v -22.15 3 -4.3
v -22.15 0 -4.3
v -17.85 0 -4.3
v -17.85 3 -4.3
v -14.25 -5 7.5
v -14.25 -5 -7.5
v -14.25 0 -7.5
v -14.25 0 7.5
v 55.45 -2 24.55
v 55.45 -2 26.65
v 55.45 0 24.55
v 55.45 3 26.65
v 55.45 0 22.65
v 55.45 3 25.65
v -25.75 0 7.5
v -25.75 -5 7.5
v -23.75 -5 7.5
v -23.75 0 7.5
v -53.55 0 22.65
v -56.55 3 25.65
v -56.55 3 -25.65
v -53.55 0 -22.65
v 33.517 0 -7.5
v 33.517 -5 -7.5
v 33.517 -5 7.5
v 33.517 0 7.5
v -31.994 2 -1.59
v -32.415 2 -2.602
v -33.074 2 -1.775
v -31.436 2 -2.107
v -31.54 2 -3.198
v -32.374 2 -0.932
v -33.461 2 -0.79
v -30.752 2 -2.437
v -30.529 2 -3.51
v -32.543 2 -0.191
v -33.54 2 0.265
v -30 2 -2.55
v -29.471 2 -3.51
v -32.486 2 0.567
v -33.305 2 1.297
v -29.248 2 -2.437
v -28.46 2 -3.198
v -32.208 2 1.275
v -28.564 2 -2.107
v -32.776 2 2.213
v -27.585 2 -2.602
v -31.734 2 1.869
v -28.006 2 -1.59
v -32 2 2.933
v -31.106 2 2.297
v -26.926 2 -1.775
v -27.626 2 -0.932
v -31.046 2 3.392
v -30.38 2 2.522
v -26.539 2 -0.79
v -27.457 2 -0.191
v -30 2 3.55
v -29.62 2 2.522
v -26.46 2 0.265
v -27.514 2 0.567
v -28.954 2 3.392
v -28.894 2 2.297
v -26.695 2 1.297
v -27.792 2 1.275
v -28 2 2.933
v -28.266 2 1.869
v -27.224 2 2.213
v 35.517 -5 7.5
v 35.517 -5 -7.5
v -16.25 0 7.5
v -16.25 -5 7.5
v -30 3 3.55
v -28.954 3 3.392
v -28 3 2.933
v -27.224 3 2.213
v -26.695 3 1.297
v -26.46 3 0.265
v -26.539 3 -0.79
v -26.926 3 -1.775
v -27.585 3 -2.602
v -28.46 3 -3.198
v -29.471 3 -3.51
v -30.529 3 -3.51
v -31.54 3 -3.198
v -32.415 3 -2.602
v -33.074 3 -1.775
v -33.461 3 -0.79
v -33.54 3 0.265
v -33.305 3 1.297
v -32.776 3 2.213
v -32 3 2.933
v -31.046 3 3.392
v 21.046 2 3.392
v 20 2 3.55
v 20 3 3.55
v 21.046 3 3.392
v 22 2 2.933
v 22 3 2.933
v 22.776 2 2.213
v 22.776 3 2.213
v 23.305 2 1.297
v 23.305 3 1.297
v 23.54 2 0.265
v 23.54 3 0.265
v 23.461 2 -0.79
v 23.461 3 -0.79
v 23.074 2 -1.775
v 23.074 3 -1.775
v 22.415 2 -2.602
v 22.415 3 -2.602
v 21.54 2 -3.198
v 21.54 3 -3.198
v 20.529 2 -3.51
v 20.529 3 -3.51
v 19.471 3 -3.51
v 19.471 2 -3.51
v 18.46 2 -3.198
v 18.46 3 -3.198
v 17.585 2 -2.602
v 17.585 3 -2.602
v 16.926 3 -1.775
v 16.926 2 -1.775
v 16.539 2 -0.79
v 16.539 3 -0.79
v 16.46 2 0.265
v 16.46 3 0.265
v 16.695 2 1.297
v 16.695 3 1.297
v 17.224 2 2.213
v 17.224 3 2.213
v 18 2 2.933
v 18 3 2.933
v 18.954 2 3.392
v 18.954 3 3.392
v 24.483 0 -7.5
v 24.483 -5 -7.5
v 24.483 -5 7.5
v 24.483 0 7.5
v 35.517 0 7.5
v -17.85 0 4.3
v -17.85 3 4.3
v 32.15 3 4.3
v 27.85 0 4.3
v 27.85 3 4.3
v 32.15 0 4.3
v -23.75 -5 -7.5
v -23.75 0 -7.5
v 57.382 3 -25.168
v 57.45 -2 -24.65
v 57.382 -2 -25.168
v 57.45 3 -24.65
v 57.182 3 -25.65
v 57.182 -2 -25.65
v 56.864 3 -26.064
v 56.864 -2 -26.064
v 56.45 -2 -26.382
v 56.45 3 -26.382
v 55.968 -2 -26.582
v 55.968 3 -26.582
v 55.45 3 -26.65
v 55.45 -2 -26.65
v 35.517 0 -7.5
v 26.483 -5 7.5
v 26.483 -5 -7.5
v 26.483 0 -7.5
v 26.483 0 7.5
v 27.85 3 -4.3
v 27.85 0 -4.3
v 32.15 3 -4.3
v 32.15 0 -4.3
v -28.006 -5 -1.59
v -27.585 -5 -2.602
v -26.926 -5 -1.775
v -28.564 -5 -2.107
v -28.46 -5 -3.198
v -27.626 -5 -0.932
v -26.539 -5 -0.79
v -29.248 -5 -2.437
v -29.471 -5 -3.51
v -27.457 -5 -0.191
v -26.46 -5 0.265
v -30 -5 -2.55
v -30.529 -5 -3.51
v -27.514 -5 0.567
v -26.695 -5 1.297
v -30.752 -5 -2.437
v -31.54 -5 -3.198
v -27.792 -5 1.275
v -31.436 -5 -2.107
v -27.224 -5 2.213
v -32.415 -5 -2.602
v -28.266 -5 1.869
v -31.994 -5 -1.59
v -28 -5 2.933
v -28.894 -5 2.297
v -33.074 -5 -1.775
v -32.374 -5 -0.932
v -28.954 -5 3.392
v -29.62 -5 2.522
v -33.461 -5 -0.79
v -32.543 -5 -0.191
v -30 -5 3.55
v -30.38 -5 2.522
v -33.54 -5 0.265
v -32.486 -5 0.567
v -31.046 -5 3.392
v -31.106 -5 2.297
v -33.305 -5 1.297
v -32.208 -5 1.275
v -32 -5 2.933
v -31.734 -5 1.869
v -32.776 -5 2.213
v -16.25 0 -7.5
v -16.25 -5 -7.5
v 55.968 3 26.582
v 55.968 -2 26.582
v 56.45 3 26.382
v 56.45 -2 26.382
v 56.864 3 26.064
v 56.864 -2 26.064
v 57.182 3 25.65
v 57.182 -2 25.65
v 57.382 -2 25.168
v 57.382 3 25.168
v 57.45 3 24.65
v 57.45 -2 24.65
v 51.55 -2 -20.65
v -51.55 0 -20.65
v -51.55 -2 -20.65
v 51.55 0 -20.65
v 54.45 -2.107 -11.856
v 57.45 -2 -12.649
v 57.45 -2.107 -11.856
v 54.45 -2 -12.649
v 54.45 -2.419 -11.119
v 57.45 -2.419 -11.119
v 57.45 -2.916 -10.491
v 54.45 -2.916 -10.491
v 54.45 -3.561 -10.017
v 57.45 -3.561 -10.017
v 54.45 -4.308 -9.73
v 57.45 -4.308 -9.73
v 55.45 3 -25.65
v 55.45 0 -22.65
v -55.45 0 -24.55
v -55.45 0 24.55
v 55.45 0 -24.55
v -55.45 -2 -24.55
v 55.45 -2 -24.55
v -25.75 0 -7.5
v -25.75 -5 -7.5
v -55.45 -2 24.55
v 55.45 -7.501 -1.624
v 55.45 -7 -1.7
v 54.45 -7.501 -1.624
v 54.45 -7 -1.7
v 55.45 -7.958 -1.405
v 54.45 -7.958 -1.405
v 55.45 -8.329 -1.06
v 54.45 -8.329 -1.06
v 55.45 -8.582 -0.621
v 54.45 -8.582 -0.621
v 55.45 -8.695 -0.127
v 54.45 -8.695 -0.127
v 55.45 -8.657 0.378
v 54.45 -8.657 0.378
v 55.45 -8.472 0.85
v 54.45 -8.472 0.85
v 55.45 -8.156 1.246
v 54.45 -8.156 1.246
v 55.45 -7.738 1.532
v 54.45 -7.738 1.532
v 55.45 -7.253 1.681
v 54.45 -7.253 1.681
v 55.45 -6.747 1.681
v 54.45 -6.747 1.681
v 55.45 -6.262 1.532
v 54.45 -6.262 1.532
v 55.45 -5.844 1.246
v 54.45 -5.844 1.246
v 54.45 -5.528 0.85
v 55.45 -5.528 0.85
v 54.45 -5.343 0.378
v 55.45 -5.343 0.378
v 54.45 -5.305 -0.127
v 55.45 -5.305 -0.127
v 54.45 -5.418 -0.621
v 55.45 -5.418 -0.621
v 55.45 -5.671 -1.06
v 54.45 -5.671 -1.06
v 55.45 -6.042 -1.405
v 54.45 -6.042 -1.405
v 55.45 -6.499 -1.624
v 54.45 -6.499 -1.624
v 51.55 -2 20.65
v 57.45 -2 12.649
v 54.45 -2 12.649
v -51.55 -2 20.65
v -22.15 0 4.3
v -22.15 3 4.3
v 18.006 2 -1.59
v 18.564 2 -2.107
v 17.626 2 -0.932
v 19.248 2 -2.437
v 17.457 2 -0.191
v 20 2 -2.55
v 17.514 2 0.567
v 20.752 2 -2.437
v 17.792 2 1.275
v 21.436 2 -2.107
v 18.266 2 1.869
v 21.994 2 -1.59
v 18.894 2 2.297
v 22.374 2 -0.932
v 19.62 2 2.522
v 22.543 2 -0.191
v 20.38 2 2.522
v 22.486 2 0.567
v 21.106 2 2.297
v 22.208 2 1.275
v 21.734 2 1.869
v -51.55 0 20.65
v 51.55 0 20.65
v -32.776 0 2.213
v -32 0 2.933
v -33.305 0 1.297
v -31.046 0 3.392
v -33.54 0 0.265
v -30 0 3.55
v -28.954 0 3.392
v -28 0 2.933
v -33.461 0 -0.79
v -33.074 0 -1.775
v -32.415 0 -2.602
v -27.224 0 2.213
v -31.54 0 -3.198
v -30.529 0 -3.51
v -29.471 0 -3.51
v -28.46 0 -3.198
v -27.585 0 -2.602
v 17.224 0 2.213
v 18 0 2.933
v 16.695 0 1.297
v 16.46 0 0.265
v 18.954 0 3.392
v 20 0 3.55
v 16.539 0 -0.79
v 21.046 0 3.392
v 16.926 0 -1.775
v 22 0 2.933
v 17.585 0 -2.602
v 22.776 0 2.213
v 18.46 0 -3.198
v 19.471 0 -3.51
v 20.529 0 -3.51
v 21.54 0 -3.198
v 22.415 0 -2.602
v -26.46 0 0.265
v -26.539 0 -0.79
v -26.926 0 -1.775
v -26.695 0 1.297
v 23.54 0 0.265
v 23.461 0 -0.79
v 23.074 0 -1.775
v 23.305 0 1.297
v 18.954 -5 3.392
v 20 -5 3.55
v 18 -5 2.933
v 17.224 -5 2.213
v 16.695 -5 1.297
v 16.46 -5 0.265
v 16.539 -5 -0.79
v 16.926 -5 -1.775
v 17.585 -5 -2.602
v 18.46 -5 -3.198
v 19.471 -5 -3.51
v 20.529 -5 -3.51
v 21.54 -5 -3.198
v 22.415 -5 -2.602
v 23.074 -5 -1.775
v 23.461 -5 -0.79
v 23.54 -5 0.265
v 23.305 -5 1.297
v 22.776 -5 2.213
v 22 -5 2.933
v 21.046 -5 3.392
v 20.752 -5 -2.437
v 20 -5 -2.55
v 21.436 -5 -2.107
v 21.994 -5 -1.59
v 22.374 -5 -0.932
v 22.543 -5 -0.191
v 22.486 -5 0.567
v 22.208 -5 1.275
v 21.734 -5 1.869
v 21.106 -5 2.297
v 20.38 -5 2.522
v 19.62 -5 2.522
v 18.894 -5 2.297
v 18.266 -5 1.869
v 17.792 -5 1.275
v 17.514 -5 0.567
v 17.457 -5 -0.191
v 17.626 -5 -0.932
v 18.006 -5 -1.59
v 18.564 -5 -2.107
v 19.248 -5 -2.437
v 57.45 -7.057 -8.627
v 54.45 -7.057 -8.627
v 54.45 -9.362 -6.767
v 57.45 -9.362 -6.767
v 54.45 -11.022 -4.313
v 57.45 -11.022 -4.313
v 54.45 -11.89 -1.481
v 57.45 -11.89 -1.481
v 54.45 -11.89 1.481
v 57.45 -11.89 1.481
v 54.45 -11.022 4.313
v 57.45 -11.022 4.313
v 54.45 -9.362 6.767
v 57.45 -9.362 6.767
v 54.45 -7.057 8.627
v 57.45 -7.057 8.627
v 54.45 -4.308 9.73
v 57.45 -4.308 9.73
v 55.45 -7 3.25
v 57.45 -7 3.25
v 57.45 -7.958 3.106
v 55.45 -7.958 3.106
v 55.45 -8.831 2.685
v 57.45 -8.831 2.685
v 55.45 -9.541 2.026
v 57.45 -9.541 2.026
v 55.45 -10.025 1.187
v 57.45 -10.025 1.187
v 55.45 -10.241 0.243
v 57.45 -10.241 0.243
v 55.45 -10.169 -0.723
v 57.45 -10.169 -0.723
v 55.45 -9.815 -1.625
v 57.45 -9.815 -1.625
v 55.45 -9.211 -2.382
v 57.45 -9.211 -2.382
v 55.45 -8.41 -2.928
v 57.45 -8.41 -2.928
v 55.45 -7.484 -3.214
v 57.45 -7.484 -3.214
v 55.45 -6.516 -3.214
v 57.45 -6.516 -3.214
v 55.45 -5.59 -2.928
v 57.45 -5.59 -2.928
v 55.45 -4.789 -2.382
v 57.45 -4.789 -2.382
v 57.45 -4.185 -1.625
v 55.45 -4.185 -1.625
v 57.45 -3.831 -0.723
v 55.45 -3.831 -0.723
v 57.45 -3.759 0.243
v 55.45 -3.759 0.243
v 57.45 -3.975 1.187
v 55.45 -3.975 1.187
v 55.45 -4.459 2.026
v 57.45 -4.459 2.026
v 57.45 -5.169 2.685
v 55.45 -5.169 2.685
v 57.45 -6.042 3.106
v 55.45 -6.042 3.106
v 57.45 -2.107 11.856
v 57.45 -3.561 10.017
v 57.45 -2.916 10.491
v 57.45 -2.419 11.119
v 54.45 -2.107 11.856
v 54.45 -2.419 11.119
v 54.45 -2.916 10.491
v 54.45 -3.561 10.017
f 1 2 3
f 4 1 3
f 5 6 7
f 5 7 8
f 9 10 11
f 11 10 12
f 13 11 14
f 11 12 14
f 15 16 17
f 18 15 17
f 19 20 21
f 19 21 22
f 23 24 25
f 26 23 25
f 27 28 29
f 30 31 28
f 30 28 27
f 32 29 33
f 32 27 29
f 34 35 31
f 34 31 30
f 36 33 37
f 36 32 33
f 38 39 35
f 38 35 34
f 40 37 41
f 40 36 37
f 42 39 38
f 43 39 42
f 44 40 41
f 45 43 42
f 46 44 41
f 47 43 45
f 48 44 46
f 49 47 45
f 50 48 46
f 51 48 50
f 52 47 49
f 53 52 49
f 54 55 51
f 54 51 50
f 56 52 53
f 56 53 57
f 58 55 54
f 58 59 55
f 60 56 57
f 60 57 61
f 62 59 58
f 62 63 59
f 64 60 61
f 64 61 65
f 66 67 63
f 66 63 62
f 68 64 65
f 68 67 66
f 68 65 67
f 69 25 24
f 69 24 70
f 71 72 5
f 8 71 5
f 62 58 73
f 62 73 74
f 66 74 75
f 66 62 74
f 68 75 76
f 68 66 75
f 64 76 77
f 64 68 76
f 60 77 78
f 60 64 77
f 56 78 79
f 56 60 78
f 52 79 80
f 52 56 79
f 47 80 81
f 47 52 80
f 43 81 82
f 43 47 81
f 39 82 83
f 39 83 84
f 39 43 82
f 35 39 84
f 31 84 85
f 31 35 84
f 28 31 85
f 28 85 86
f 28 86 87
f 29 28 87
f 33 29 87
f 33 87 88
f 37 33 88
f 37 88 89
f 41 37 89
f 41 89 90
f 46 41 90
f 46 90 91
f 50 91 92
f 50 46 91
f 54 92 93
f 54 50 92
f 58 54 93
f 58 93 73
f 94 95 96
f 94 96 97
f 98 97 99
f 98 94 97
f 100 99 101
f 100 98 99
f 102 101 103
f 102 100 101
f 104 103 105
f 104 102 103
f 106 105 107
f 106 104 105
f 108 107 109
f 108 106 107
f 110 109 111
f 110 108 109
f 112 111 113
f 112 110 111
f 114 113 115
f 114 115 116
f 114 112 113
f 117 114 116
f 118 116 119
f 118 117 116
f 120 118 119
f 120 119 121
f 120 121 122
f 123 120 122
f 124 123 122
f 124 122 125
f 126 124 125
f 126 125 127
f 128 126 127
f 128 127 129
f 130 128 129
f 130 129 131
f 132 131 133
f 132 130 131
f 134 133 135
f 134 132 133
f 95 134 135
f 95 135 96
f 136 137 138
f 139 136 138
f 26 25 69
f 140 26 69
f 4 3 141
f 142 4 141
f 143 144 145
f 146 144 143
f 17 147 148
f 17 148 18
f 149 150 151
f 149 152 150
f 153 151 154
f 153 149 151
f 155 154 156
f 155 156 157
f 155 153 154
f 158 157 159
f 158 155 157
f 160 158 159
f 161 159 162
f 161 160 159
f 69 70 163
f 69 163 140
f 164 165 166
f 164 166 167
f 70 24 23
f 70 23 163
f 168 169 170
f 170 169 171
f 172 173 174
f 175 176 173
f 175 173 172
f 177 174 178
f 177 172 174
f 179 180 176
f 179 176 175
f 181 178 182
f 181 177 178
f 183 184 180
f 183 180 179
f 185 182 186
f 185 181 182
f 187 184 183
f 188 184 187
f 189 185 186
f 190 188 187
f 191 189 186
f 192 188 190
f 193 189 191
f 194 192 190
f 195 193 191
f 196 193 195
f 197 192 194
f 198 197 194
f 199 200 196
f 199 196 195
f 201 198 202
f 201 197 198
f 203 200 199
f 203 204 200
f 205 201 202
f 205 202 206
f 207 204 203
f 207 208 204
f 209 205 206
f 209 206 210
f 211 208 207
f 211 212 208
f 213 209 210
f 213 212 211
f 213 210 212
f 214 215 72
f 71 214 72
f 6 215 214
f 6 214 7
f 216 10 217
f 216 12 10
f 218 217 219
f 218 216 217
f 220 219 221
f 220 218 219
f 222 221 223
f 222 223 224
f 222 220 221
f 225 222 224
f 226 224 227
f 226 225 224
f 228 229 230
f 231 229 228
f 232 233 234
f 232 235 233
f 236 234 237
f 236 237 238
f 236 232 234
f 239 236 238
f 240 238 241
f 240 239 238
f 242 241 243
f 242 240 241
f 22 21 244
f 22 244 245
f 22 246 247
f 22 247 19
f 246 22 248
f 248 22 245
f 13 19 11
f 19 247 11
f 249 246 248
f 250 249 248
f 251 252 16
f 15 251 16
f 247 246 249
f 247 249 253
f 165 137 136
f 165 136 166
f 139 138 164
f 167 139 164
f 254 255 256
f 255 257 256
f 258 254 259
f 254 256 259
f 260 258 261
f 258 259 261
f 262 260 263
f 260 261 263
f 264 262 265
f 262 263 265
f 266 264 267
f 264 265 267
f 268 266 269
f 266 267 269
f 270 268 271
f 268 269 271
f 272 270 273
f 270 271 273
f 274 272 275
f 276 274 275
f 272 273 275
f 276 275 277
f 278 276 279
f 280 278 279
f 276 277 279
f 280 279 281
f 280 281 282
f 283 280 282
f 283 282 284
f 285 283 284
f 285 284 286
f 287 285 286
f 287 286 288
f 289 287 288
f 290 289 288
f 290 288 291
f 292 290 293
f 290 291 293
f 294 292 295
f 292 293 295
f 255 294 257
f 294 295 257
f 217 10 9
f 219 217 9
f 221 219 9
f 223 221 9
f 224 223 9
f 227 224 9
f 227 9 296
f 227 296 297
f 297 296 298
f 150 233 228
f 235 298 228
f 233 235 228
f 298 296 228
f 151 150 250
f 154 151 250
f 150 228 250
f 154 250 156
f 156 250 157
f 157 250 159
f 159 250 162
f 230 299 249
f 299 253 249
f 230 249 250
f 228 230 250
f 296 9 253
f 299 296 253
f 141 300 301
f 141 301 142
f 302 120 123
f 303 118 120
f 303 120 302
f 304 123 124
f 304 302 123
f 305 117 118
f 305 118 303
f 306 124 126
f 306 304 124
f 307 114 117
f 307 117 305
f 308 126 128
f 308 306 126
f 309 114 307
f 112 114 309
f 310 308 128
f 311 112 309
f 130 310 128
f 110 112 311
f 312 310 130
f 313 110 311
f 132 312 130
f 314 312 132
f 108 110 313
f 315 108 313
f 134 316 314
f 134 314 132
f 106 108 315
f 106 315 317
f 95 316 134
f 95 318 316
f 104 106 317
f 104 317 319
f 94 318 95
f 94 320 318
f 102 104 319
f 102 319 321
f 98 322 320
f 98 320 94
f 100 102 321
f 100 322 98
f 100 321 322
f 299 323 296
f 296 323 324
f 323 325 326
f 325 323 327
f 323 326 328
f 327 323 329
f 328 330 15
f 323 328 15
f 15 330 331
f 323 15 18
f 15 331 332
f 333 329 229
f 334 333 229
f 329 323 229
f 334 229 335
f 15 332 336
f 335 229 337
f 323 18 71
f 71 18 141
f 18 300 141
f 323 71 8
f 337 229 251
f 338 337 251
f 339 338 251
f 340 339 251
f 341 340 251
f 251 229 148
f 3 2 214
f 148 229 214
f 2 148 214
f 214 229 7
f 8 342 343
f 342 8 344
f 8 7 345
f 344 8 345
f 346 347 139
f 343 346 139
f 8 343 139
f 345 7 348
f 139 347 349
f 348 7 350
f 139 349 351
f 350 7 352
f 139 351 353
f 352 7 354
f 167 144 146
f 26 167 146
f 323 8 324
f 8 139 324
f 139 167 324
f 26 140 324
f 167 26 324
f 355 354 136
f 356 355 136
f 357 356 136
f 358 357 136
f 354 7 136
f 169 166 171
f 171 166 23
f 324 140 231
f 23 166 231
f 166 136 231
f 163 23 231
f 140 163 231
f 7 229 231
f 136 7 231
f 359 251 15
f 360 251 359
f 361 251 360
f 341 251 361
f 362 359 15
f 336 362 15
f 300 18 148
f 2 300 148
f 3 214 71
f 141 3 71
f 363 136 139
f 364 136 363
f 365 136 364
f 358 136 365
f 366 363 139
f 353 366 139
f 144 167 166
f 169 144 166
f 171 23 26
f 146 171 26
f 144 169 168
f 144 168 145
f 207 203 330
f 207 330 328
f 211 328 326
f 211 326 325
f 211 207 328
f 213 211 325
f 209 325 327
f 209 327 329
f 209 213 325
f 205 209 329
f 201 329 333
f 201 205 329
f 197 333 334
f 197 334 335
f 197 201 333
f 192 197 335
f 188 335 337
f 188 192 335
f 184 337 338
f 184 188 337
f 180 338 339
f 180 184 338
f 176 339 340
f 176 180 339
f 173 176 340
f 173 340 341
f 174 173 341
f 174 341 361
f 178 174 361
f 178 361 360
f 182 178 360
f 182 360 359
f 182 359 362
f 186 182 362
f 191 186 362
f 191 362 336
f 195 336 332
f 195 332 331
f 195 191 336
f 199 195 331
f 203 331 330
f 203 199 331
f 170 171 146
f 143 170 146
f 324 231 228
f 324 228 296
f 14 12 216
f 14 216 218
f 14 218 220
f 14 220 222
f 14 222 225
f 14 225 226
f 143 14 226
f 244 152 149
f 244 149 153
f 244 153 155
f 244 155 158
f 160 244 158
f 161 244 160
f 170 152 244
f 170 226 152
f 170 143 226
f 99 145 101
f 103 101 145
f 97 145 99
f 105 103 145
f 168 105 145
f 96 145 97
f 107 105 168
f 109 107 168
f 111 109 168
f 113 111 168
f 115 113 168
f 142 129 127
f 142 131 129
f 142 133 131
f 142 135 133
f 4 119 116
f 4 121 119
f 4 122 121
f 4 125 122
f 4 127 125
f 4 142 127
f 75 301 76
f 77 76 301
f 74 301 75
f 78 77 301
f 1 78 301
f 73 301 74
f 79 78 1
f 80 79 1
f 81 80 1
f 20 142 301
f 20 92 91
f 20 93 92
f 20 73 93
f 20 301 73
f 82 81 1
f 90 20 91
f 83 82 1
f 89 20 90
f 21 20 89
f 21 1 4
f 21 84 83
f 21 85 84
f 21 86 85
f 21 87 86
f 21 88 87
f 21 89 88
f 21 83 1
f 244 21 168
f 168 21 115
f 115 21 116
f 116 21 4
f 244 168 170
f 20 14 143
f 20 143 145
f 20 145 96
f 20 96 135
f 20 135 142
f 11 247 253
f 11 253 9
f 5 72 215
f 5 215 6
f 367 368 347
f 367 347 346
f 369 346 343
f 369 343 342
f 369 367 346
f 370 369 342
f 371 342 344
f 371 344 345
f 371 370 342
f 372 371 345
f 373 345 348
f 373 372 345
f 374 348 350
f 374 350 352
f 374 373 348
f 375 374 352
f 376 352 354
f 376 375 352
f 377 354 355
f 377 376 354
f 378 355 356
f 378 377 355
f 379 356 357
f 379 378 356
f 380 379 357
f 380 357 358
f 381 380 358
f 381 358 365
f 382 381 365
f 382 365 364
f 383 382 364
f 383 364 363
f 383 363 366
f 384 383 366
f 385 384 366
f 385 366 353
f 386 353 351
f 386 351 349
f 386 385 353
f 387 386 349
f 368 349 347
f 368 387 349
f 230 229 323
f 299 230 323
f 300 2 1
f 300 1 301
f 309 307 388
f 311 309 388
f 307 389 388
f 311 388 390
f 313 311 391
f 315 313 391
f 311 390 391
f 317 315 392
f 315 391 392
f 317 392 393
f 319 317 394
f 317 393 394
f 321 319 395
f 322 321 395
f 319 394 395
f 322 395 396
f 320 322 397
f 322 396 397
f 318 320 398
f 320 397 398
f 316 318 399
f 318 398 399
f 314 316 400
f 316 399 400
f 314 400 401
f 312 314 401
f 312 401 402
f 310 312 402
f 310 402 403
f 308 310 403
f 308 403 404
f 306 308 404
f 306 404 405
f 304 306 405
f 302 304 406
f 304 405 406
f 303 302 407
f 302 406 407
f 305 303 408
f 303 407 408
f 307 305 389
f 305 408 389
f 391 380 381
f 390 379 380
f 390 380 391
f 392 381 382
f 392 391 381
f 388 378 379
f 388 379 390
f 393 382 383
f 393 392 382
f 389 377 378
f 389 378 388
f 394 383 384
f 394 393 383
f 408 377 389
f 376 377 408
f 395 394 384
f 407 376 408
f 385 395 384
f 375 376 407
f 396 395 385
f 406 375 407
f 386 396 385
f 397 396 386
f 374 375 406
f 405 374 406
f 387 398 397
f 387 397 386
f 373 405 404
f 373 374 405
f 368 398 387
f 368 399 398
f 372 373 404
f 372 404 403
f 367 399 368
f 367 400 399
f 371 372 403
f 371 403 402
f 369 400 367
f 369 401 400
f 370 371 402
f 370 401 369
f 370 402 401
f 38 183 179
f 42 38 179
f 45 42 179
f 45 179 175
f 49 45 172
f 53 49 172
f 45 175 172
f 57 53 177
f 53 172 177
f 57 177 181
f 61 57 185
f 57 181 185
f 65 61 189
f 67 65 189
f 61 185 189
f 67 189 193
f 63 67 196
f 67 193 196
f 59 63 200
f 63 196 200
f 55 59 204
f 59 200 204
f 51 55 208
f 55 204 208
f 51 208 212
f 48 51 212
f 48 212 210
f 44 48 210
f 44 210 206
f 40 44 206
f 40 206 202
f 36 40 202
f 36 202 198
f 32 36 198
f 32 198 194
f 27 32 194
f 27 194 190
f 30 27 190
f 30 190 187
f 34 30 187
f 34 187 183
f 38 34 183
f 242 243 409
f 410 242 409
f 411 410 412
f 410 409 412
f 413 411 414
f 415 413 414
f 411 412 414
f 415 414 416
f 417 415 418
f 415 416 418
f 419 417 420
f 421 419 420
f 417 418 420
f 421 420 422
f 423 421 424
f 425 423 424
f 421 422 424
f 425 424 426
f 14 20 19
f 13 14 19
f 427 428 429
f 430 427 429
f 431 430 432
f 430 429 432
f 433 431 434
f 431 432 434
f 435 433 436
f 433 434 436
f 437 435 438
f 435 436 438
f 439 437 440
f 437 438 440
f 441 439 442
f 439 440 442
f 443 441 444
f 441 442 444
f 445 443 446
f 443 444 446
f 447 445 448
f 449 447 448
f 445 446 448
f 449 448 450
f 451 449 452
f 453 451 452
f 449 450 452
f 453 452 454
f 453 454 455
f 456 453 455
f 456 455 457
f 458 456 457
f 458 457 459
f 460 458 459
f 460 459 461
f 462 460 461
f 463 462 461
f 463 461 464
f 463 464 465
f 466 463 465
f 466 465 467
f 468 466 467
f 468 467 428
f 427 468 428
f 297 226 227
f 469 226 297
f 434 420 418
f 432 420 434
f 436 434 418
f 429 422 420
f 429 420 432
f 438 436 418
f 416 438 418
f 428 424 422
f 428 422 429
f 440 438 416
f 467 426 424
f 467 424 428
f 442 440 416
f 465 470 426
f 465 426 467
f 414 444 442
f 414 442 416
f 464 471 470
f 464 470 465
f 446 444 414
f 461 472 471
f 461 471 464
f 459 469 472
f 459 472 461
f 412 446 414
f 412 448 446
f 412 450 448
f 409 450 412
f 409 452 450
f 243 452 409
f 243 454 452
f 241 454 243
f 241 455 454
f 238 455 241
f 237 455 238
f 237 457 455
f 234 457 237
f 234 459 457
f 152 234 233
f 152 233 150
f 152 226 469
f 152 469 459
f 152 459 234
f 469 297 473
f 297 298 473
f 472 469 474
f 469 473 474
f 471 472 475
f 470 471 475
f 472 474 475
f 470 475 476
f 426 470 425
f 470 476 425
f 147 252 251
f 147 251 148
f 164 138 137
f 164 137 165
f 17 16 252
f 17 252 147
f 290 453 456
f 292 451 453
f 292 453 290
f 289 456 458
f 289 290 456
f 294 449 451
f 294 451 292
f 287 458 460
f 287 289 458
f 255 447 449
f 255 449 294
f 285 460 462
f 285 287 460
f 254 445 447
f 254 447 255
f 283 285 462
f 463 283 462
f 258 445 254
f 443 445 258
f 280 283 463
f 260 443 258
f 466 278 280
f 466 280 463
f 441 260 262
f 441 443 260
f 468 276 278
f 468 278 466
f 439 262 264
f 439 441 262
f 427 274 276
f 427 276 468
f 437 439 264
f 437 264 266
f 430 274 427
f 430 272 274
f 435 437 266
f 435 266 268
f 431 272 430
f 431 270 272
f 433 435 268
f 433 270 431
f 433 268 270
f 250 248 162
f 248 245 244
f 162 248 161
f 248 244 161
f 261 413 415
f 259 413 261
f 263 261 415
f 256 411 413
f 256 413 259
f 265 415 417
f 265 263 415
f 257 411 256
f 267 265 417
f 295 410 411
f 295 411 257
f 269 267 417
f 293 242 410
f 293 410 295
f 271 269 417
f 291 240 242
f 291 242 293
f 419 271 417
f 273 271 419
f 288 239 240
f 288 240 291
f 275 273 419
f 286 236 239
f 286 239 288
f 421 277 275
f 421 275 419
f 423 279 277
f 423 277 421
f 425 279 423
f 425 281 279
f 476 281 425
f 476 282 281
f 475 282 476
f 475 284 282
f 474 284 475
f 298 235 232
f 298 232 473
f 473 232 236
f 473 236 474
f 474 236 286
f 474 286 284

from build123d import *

# Parameters (mm, degrees)
SKETCH1_W                                   = 107.1
SKETCH1_H                                   = 45.3
BOSS_EXTRUDE1_DEPTH                         = 3
SKETCH2_W                                   = 110.9
SKETCH2_H                                   = 49.1
SKETCH2_W_2                                 = 103.1
SKETCH2_H_2                                 = 41.3
BOSS_EXTRUDE2_DEPTH                         = 2
SKETCH5_W                                   = 44.185299266
SKETCH5_H                                   = 3
BOSS_EXTRUDE3_DEPTH                         = 1.9
SKETCH6_W                                   = 53.3
SKETCH6_H                                   = 5
BOSS_EXTRUDE4_DEPTH                         = 2
FILLET1_R                                   = 2
BOSS_EXTRUDE5_DEPTH                         = 3
FILLET2_R                                   = 3
CBORE_FOR_M3_CHEESE_HEAD_SCREW1_D           = 3.4
CBORE_FOR_M3_CHEESE_HEAD_SCREW1_CBORE_D     = 6.5
CBORE_FOR_M3_CHEESE_HEAD_SCREW1_CBORE_DEPTH = 2
SKETCH9_R                                   = 2.55
SKETCH9_W                                   = 4.3
SKETCH9_H                                   = 8.6
CUT_EXTRUDE1_DEPTH                          = 65.457156313
BOSS_EXTRUDE6_START                         = 5
SKETCH11_R                                  = 3.55
SKETCH11_R_2                                = 2.55
SKETCH11_W                                  = 2
SKETCH11_H                                  = 15
BOSS_EXTRUDE6_DEPTH                         = 5
CUT_EXTRUDE2_START                          = -1
SKETCH12_R                                  = 3.55
CUT_EXTRUDE2_DEPTH                          = 1


with BuildPart() as part:
    # Sketch1 → Boss-Extrude1 (new body)
    with BuildSketch(Plane(origin=(0, 0, 0), x_dir=(1, 0, 0), z_dir=(0, 1, 0))):
        Rectangle(SKETCH1_W, SKETCH1_H)
    extrude(amount=BOSS_EXTRUDE1_DEPTH)

    # Sketch2 → Boss-Extrude2 (add)
    with BuildSketch(Plane.XZ):
        Rectangle(SKETCH2_W, SKETCH2_H)
        Rectangle(SKETCH2_W_2, SKETCH2_H_2, mode=Mode.SUBTRACT)
    extrude(amount=BOSS_EXTRUDE2_DEPTH)

    # Sweep3: sweep along a path in Sketch4
    with BuildLine(Plane(origin=(0, 0, 0), x_dir=(1, 0, 0), z_dir=(0, 1, 0))) as sweep3_path:
        Line((55.45, 24.55), (-55.45, 24.55))
        Line((-55.45, 24.55), (-55.45, -24.55))
        Line((-55.45, -24.55), (55.45, -24.55))
    # Sketch3 → Sweep3 (sweep)
    with BuildSketch(Plane(origin=(55.45, 0, 0), x_dir=(0, 0, -1), z_dir=(1, 0, 0))):
        Polygon((-22.65, 3), (-25.65, 3), (-22.65, 0), (-22.092649633, 0), (-22.092649633, 3), align=None)
    sweep(path=sweep3_path.line, transition=Transition.RIGHT)

    # Sketch5 → Boss-Extrude3 (add)
    with BuildSketch(Plane(origin=(53.55, 0, 0), x_dir=(0, 0, -1), z_dir=(1, 0, 0))):
        with Locations((0, 1.5)):
            Rectangle(SKETCH5_W, SKETCH5_H)
    extrude(amount=BOSS_EXTRUDE3_DEPTH)

    # Sketch6 → Boss-Extrude4 (add)
    with BuildSketch(Plane(origin=(55.45, 0, 0), x_dir=(0, 0, -1), z_dir=(1, 0, 0))):
        with Locations((0, 0.5)):
            Rectangle(SKETCH6_W, SKETCH6_H)
    extrude(amount=BOSS_EXTRUDE4_DEPTH)

    # Fillet1
    fillet1_edges = [part.edges().sort_by_distance(p)[0] for p in [
        (57.45, 0.5, 26.65),
        (57.45, 0.5, -26.65),
    ]]
    fillet(fillet1_edges, radius=FILLET1_R - 0.0001)  # a hair under: the kernel refuses the full size

    # Sketch7 → Boss-Extrude5 (add)
    with BuildSketch(Plane(origin=(57.45, 0, 0), x_dir=(0, 0, -1), z_dir=(1, 0, 0))):
        with BuildLine():
            Line((-10, -2), (10, -2))
            ThreePointArc((10, -2), (0, -12), (-10, -2))
        make_face()
    extrude(amount=-BOSS_EXTRUDE5_DEPTH)

    # Fillet2
    fillet2_edges = [part.edges().sort_by_distance(p)[0] for p in [
        (55.95, -2, -10),
        (55.95, -2, 10),
    ]]
    fillet(fillet2_edges, radius=FILLET2_R)

    # CBORE for M3 Cheese Head Screw1 (through all)
    with Locations(Plane(origin=(57.45, -7, 0), x_dir=(0, 0, 1), z_dir=(1, 0, 0))):
        with Locations((0, 0)):
            CounterBoreHole(CBORE_FOR_M3_CHEESE_HEAD_SCREW1_D / 2, CBORE_FOR_M3_CHEESE_HEAD_SCREW1_CBORE_D / 2, CBORE_FOR_M3_CHEESE_HEAD_SCREW1_CBORE_DEPTH)

    # Sketch9 → Cut-Extrude1 (cut, through all)
    with BuildSketch(Plane.XZ):
        with Locations(Location((20, 0, 0), (0, 0, 270))):
            Circle(SKETCH9_R)
        with Locations(Location((-30, 0, 0), (0, 0, 270))):
            Circle(SKETCH9_R)
        with Locations((30, 0)):
            Rectangle(SKETCH9_W, SKETCH9_H)
        with Locations((-20, 0)):
            Rectangle(SKETCH9_W, SKETCH9_H)
    extrude(amount=-CUT_EXTRUDE1_DEPTH, mode=Mode.SUBTRACT)

    # Sketch11 → Boss-Extrude6 (add)
    # profile 1 of 6: a face of its own
    with BuildSketch(Plane.XZ.offset(BOSS_EXTRUDE6_START)):
        with Locations(Location((-30, 0, 0), (0, 0, 90))):
            Circle(SKETCH11_R)
        with Locations(Location((-30, 0, 0), (0, 0, 270))):
            Circle(SKETCH11_R_2, mode=Mode.SUBTRACT)
    # profile 2 of 6: a face of its own
    with BuildSketch(Plane.XZ.offset(BOSS_EXTRUDE6_START)):
        with Locations(Location((20, 0, 0), (0, 0, 90))):
            Circle(SKETCH11_R)
        with Locations(Location((20, 0, 0), (0, 0, 270))):
            Circle(SKETCH11_R_2, mode=Mode.SUBTRACT)
    # profile 3 of 6: a face of its own
    with BuildSketch(Plane.XZ.offset(BOSS_EXTRUDE6_START)):
        with Locations((-15.25, 0)):
            Rectangle(SKETCH11_W, SKETCH11_H)
    # profile 4 of 6: a face of its own
    with BuildSketch(Plane.XZ.offset(BOSS_EXTRUDE6_START)):
        with Locations((-24.75, 0)):
            Rectangle(SKETCH11_W, SKETCH11_H)
    # profile 5 of 6: a face of its own
    with BuildSketch(Plane.XZ.offset(BOSS_EXTRUDE6_START)):
        with Locations((34.516532033, 0)):
            Rectangle(SKETCH11_W, SKETCH11_H)
    # profile 6 of 6: a face of its own
    with BuildSketch(Plane.XZ.offset(BOSS_EXTRUDE6_START)):
        with Locations((25.483467967, 0)):
            Rectangle(SKETCH11_W, SKETCH11_H)
    extrude(amount=-BOSS_EXTRUDE6_DEPTH)

    # Sketch12 → Cut-Extrude2 (cut)
    with BuildSketch(Plane(origin=(0, 3, 0), x_dir=(1, 0, 0), z_dir=(0, 1, 0)).offset(CUT_EXTRUDE2_START)):
        with Locations(Location((-30, 0, 0), (0, 0, 270))):
            Circle(SKETCH12_R)
        with Locations(Location((20, 0, 0), (0, 0, 270))):
            Circle(SKETCH12_R)
    extrude(amount=CUT_EXTRUDE2_DEPTH, mode=Mode.SUBTRACT)


solid = part.part
